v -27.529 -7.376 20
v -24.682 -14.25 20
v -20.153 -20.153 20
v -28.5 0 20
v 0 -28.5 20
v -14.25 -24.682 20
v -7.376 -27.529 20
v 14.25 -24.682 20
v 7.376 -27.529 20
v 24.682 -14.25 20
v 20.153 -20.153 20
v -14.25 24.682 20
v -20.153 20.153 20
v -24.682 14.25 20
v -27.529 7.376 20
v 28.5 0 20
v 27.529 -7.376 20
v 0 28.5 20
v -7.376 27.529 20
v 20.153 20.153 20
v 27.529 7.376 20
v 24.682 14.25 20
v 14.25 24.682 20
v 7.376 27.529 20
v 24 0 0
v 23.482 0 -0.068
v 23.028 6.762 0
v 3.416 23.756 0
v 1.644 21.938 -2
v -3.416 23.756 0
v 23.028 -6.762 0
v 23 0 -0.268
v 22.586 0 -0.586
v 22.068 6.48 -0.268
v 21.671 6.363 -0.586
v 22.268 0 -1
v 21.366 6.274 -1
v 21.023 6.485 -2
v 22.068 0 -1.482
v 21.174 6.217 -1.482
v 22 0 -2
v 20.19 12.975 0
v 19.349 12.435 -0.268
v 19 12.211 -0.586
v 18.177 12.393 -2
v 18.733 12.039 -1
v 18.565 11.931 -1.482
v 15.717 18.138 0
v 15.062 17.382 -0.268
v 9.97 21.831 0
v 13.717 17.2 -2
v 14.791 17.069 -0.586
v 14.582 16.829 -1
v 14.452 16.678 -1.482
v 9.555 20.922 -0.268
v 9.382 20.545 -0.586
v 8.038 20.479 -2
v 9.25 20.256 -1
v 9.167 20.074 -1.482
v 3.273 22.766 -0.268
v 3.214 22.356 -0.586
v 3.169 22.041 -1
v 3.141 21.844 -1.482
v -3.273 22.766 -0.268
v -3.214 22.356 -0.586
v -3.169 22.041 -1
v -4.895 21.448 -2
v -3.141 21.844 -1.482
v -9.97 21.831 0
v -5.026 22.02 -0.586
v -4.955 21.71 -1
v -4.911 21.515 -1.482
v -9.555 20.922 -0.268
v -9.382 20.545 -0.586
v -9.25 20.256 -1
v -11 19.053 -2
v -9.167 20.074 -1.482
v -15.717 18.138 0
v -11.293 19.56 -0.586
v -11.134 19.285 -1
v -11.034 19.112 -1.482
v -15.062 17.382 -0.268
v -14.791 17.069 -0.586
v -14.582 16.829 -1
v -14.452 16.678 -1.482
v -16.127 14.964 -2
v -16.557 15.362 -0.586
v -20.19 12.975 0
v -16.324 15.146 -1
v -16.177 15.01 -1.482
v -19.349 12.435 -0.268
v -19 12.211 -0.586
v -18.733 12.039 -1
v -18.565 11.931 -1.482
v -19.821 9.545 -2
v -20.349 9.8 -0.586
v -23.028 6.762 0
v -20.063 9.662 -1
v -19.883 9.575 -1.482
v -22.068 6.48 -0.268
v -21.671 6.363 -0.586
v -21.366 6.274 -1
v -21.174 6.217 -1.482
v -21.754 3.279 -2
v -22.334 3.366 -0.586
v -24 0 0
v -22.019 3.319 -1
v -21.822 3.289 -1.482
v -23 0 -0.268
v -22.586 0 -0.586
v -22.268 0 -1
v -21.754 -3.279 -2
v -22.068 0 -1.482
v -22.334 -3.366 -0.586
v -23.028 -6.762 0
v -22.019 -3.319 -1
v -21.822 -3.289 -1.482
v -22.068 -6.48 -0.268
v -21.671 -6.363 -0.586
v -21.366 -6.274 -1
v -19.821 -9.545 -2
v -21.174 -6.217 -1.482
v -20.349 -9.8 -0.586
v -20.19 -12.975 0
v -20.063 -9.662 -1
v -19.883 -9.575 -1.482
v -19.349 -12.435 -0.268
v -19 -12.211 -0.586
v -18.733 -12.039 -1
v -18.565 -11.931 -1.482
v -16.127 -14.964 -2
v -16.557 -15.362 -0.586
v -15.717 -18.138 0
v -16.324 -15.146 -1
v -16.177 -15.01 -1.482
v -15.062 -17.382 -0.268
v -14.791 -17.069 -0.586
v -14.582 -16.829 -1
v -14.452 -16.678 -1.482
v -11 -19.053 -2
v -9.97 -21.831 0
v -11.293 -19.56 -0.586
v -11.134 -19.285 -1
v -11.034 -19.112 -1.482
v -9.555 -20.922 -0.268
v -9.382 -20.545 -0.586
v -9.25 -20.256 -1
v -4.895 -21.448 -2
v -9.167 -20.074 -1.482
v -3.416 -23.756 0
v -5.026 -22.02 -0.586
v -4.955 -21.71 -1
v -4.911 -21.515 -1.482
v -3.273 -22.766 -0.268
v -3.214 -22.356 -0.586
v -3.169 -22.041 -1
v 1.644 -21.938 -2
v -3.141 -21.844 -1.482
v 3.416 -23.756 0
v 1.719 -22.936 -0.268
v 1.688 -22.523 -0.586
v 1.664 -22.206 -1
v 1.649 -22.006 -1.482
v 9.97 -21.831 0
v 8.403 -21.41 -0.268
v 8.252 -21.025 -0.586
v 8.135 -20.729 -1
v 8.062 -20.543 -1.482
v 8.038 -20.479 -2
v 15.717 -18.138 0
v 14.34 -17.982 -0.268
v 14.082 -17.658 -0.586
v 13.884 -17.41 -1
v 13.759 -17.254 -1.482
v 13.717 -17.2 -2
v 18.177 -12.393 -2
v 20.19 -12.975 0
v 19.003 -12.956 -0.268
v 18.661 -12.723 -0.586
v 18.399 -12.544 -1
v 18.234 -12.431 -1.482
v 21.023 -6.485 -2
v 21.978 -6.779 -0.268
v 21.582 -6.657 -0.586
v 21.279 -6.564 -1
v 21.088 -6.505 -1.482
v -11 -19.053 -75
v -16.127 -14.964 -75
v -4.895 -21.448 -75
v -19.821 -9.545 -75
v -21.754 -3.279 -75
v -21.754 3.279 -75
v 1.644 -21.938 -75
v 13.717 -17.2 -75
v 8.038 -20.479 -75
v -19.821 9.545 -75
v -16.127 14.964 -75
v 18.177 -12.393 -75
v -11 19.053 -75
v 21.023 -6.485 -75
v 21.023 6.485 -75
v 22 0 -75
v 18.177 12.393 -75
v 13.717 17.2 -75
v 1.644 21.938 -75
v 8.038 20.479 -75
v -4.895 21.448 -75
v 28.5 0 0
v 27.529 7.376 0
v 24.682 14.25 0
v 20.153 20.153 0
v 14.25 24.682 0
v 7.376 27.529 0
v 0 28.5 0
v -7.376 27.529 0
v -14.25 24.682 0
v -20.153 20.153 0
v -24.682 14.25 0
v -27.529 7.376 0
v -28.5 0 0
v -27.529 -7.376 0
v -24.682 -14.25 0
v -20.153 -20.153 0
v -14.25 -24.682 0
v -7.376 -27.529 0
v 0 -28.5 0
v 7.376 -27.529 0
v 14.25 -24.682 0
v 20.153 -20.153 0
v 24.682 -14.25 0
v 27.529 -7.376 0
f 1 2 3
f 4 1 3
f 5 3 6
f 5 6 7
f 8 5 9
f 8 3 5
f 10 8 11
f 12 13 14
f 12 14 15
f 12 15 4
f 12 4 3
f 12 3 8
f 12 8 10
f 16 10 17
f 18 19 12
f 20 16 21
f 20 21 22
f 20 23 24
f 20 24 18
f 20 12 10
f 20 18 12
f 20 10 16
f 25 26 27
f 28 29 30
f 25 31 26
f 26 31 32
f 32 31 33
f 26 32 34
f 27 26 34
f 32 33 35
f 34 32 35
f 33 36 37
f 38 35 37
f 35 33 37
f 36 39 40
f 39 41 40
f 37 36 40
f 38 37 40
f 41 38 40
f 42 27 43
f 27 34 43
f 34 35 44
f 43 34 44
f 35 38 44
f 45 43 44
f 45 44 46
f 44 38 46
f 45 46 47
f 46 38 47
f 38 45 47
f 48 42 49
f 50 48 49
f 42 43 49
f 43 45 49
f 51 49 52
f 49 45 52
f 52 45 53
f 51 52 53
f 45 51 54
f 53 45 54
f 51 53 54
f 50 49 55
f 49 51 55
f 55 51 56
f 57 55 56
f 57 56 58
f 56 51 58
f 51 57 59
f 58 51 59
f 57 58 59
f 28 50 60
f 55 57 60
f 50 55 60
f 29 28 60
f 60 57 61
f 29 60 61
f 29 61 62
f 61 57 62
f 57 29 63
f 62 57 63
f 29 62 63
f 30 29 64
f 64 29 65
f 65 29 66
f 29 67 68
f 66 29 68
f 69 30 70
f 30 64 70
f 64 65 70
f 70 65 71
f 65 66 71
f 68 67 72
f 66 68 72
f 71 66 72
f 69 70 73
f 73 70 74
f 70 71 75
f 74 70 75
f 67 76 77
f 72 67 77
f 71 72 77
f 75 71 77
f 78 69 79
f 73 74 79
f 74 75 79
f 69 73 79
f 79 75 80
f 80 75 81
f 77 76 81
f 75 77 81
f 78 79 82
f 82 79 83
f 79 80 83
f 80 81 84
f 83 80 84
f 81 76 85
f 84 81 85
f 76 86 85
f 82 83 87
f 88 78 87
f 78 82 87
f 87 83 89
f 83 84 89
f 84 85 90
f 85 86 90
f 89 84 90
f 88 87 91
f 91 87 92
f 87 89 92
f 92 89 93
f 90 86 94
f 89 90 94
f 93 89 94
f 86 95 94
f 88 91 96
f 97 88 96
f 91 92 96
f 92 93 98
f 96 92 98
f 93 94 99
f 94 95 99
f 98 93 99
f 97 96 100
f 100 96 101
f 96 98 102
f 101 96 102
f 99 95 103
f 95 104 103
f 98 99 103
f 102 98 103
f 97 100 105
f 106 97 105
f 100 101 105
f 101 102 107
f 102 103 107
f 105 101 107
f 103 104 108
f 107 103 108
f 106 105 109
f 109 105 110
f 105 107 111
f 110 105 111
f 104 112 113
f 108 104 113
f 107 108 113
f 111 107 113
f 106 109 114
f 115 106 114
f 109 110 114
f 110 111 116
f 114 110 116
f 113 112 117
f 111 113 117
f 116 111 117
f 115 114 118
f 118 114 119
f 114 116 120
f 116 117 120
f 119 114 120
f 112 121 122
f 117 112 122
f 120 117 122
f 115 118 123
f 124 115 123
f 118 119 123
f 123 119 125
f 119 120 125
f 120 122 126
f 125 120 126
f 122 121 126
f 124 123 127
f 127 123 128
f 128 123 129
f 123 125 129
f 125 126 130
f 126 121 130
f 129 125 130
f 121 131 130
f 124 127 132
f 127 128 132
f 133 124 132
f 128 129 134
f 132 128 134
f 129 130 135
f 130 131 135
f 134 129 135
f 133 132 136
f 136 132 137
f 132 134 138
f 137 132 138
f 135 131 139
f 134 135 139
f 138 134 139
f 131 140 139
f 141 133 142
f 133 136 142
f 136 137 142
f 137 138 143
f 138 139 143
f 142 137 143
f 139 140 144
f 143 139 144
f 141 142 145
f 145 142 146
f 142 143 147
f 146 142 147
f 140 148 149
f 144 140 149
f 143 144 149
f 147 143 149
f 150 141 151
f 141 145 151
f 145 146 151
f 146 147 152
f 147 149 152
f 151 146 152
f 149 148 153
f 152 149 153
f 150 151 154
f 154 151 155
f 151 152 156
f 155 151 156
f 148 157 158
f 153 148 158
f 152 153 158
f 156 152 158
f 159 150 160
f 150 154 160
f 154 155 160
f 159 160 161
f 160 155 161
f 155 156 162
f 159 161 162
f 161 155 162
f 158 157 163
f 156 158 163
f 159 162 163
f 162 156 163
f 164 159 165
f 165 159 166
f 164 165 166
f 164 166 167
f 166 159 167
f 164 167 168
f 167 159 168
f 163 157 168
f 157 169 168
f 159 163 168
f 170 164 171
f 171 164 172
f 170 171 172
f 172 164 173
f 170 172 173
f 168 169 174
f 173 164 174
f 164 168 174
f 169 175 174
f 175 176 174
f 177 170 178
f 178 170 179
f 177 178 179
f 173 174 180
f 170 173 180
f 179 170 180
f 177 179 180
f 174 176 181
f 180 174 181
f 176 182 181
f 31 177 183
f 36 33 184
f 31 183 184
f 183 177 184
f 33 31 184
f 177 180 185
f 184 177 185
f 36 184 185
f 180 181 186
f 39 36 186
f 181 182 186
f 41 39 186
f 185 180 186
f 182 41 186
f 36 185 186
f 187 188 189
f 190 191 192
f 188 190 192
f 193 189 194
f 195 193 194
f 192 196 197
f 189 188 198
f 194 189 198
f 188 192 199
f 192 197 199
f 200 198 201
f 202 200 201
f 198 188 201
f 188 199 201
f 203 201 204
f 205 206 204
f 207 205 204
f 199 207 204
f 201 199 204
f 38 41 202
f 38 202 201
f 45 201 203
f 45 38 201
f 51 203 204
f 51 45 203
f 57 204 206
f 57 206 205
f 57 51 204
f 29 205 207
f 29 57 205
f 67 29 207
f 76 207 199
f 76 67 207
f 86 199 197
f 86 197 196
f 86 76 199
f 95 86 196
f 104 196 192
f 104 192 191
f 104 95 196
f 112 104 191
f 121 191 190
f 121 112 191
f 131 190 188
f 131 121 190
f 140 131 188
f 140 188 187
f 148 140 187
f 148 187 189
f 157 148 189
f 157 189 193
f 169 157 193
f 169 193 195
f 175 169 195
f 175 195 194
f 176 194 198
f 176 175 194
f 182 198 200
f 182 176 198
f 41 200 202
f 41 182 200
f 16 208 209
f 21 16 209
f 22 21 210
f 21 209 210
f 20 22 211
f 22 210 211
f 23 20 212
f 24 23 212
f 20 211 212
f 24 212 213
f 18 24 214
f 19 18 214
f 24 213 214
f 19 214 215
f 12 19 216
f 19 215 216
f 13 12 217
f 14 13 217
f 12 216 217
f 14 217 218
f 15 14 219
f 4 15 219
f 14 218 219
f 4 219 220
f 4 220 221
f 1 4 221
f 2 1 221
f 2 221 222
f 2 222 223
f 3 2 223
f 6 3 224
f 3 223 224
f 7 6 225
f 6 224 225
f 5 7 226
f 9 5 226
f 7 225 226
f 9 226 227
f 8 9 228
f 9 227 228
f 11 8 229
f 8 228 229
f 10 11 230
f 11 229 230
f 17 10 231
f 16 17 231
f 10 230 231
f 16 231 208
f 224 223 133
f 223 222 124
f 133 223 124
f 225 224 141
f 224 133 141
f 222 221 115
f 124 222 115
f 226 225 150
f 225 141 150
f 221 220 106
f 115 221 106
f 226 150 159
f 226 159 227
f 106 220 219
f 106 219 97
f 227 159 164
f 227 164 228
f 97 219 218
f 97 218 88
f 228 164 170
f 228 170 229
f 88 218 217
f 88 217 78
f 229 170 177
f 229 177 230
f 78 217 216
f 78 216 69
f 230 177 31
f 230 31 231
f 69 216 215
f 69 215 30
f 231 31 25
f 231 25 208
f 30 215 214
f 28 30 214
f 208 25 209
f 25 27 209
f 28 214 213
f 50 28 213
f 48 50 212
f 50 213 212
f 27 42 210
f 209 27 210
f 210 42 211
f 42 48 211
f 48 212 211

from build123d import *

# Parameters (mm, degrees)
SKETCH1_R           = 22
BOSS_EXTRUDE1_DEPTH = 75
SKETCH2_R           = 28.5
BOSS_EXTRUDE2_DEPTH = 20
FILLET1_R           = 2


with BuildPart() as part:
    # Sketch1 → Boss-Extrude1 (new body)
    with BuildSketch(Plane.XY):
        Circle(SKETCH1_R)
    extrude(amount=-BOSS_EXTRUDE1_DEPTH)

    # Sketch2 → Boss-Extrude2 (add)
    with BuildSketch(Plane.XY):
        Circle(SKETCH2_R)
    extrude(amount=BOSS_EXTRUDE2_DEPTH)

    # Fillet1
    fillet1_edges = [part.edges().sort_by_distance(p)[0] for p in [
        (-22, 0, 0),
    ]]
    fillet(fillet1_edges, radius=FILLET1_R)


solid = part.part
